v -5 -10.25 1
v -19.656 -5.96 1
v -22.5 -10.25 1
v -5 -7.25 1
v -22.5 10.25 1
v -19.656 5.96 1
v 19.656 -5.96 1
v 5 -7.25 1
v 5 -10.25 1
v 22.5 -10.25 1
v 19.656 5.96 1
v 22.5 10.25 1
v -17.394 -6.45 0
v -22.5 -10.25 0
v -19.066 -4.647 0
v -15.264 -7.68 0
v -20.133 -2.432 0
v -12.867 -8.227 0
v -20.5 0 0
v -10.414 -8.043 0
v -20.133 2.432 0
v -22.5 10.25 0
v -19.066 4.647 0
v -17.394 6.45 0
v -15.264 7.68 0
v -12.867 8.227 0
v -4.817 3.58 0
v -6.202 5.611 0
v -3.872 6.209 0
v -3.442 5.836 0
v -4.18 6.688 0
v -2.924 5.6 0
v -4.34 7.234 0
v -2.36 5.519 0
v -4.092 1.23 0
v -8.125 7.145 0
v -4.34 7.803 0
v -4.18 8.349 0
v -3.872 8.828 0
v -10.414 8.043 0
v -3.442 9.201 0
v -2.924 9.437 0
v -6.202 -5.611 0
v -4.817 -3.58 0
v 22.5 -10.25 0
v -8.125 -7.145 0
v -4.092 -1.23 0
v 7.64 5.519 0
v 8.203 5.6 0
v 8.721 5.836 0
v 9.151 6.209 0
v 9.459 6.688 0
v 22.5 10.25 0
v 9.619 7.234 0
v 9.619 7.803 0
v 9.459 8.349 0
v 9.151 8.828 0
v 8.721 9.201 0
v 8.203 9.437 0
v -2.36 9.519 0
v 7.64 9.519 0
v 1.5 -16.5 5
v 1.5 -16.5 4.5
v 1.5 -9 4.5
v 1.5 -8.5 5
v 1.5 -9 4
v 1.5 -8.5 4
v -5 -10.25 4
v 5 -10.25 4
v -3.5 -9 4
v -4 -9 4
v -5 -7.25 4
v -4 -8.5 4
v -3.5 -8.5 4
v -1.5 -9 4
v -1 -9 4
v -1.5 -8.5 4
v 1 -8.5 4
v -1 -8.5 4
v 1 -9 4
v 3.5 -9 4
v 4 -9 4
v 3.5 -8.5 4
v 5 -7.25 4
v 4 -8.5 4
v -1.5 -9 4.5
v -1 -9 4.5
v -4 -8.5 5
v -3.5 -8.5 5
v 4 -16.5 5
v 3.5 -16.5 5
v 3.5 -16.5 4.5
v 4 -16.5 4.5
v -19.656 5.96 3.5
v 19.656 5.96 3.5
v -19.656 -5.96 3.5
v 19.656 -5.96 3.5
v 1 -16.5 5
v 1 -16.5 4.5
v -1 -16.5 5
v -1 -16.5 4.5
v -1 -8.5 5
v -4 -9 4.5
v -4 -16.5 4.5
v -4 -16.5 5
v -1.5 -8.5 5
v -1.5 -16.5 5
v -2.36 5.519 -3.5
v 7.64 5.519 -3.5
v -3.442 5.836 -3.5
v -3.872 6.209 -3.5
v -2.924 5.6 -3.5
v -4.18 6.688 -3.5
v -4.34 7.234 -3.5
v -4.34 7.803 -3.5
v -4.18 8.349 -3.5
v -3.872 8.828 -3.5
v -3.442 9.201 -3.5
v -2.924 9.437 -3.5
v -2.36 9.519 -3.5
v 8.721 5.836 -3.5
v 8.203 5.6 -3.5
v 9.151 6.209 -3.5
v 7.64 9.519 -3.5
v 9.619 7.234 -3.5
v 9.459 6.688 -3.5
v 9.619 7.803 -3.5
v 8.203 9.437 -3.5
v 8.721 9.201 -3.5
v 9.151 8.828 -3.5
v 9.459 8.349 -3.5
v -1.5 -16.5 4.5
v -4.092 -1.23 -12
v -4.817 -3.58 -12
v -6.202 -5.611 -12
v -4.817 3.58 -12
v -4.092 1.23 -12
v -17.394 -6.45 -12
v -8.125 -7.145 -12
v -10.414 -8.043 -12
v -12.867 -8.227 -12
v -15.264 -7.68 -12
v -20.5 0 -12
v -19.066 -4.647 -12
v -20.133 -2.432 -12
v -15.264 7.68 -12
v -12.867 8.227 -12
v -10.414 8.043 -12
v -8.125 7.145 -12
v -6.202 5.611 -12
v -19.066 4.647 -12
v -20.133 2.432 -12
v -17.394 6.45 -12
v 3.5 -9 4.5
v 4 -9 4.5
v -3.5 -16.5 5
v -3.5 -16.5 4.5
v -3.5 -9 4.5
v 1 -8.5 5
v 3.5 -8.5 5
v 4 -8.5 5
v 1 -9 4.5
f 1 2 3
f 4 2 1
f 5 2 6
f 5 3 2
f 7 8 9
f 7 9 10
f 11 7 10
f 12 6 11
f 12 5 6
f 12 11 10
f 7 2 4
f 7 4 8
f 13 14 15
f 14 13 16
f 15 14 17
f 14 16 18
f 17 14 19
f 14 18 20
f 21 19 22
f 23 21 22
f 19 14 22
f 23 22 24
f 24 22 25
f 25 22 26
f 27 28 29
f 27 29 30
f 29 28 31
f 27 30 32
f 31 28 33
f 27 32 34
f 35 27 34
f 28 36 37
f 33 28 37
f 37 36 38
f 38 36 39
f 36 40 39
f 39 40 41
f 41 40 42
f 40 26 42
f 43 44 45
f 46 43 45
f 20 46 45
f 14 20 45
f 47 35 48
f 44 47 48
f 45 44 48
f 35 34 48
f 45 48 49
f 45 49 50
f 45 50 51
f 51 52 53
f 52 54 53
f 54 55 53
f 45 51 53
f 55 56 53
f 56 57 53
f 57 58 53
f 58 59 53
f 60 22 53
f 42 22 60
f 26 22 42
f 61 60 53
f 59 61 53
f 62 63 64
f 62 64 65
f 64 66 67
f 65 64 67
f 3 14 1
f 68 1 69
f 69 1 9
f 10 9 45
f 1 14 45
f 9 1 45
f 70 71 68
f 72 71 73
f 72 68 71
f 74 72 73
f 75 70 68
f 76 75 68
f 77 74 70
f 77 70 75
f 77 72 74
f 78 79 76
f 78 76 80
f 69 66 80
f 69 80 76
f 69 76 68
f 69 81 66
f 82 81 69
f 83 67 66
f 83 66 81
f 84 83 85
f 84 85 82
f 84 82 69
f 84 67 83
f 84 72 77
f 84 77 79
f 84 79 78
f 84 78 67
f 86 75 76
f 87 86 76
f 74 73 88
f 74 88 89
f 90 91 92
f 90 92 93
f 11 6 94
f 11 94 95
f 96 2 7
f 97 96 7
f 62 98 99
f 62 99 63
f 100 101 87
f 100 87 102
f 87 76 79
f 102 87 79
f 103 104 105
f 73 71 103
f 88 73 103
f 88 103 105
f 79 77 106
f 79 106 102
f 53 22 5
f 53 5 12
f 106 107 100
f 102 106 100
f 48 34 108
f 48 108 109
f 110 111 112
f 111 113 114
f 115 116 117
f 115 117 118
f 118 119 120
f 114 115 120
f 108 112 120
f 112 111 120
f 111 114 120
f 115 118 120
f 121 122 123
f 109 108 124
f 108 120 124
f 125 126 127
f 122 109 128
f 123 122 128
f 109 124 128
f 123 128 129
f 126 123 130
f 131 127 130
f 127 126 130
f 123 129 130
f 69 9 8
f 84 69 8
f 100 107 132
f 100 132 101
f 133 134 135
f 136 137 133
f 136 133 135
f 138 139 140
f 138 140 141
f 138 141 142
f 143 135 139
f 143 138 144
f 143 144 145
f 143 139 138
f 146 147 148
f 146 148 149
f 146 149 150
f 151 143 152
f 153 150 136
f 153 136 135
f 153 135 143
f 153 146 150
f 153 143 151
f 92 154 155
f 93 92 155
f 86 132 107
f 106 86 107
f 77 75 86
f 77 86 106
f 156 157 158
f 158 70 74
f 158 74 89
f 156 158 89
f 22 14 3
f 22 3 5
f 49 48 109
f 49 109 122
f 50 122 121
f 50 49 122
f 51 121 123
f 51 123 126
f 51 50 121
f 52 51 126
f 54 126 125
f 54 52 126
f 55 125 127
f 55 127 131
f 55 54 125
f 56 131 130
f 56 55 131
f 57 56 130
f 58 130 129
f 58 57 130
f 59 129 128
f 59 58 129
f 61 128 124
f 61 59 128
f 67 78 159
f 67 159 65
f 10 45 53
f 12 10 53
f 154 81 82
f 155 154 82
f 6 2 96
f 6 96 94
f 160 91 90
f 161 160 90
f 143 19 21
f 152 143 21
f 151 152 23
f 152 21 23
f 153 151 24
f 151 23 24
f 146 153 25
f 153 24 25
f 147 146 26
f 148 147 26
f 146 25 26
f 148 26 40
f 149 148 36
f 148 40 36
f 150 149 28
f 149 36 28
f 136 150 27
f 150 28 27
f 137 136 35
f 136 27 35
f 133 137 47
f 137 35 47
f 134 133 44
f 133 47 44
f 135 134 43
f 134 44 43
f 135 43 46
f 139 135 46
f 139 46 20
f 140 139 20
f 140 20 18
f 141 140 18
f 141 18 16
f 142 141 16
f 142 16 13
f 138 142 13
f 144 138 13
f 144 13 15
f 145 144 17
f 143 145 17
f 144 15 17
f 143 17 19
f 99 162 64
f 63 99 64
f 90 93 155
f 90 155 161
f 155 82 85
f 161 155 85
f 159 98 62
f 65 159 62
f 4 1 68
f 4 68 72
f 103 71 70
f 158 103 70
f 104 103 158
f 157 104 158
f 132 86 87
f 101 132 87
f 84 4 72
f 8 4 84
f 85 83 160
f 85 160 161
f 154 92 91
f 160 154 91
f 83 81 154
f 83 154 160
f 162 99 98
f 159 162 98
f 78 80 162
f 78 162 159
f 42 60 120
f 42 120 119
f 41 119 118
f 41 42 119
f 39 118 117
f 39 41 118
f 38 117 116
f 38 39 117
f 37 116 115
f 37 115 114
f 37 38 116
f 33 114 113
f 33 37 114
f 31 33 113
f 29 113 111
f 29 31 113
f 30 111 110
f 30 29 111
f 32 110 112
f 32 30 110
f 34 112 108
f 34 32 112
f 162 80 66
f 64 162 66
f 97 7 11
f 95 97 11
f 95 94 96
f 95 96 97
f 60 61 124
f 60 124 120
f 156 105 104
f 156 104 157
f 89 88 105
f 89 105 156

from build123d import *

# Parameters (mm, degrees)
SKETCH1_W           = 45
SKETCH1_H           = 20.5
BOSS_EXTRUDE1_DEPTH = 1
SKETCH3_R           = 8.25
BOSS_EXTRUDE2_DEPTH = 12
BOSS_EXTRUDE3_DEPTH = 3.5
SKETCH6_W           = 39.311963292
SKETCH6_H           = 11.9190527
BOSS_EXTRUDE4_DEPTH = 2.5
SKETCH7_W           = 10
SKETCH7_H           = 3
BOSS_EXTRUDE5_DEPTH = 3
SKETCH8_W           = 0.5
SKETCH8_H           = 0.5
BOSS_EXTRUDE6_DEPTH = 4
SKETCH9_W           = 9
SKETCH9_H           = 3
CUT_EXTRUDE1_DEPTH  = 4
SKETCH10_W          = 0.5
SKETCH10_H          = 0.5
BOSS_EXTRUDE7_DEPTH = 7.5


with BuildPart() as part:
    # Sketch1 → Boss-Extrude1 (new body)
    with BuildSketch(Plane.XY):
        Rectangle(SKETCH1_W, SKETCH1_H)
    extrude(amount=BOSS_EXTRUDE1_DEPTH)

    # Sketch3 → Boss-Extrude2 (add)
    with BuildSketch(Plane(origin=(0, 0, 0), x_dir=(-1, 0, 0), z_dir=(0, 0, -1))):
        with Locations((12.25, 0)):
            Circle(SKETCH3_R)
    extrude(amount=BOSS_EXTRUDE2_DEPTH)

    # Sketch4 → Boss-Extrude3 (add)
    with BuildSketch(Plane(origin=(0, 0, 0), x_dir=(-1, 0, 0), z_dir=(0, 0, -1))):
        with BuildLine():
            Line((-7.639519339, 9.518507805), (2.360480661, 9.518507805))
            ThreePointArc((2.360480661, 9.518507805), (4.360480661, 7.518507805), (2.360480661, 5.518507805))
            Line((2.360480661, 5.518507805), (-7.639519339, 5.518507805))
            ThreePointArc((-7.639519339, 5.518507805), (-9.639519339, 7.518507805), (-7.639519339, 9.518507805))
        make_face()
    extrude(amount=BOSS_EXTRUDE3_DEPTH)

    # Sketch6 → Boss-Extrude4 (add)
    with BuildSketch(Plane.XY.offset(1)):
        Rectangle(SKETCH6_W, SKETCH6_H)
    extrude(amount=BOSS_EXTRUDE4_DEPTH)

    # Sketch7 → Boss-Extrude5 (add)
    with BuildSketch(Plane.XY.offset(1)):
        with Locations((0, -8.75)):
            Rectangle(SKETCH7_W, SKETCH7_H)
    extrude(amount=BOSS_EXTRUDE5_DEPTH)

    # Sketch8 → Boss-Extrude6 (add)
    with BuildSketch(Plane.XY.offset(4)):
        with Locations((-3.75, -8.75)):
            Rectangle(SKETCH8_W, SKETCH8_H)
        with Locations((-1.25, -8.75)):
            Rectangle(SKETCH8_W, SKETCH8_H)
        with Locations((1.25, -8.75)):
            Rectangle(SKETCH8_W, SKETCH8_H)
        with Locations((3.75, -8.75)):
            Rectangle(SKETCH8_W, SKETCH8_H)
    extrude(amount=BOSS_EXTRUDE6_DEPTH)

    # Sketch9 → Cut-Extrude1 (cut)
    with BuildSketch(Plane.XZ.offset(10.25)):
        with Locations((-0.5, 6.5)):
            Rectangle(SKETCH9_W, SKETCH9_H)
    extrude(amount=-CUT_EXTRUDE1_DEPTH, mode=Mode.SUBTRACT)

    # Sketch10 → Boss-Extrude7 (add)
    with BuildSketch(Plane.XZ.offset(9)):
        with Locations((-3.75, 4.75)):
            Rectangle(SKETCH10_W, SKETCH10_H)
        with Locations((-1.25, 4.75)):
            Rectangle(SKETCH10_W, SKETCH10_H)
        with Locations((1.25, 4.75)):
            Rectangle(SKETCH10_W, SKETCH10_H)
        with Locations((3.75, 4.75)):
            Rectangle(SKETCH10_W, SKETCH10_H)
    extrude(amount=BOSS_EXTRUDE7_DEPTH)


solid = part.part
